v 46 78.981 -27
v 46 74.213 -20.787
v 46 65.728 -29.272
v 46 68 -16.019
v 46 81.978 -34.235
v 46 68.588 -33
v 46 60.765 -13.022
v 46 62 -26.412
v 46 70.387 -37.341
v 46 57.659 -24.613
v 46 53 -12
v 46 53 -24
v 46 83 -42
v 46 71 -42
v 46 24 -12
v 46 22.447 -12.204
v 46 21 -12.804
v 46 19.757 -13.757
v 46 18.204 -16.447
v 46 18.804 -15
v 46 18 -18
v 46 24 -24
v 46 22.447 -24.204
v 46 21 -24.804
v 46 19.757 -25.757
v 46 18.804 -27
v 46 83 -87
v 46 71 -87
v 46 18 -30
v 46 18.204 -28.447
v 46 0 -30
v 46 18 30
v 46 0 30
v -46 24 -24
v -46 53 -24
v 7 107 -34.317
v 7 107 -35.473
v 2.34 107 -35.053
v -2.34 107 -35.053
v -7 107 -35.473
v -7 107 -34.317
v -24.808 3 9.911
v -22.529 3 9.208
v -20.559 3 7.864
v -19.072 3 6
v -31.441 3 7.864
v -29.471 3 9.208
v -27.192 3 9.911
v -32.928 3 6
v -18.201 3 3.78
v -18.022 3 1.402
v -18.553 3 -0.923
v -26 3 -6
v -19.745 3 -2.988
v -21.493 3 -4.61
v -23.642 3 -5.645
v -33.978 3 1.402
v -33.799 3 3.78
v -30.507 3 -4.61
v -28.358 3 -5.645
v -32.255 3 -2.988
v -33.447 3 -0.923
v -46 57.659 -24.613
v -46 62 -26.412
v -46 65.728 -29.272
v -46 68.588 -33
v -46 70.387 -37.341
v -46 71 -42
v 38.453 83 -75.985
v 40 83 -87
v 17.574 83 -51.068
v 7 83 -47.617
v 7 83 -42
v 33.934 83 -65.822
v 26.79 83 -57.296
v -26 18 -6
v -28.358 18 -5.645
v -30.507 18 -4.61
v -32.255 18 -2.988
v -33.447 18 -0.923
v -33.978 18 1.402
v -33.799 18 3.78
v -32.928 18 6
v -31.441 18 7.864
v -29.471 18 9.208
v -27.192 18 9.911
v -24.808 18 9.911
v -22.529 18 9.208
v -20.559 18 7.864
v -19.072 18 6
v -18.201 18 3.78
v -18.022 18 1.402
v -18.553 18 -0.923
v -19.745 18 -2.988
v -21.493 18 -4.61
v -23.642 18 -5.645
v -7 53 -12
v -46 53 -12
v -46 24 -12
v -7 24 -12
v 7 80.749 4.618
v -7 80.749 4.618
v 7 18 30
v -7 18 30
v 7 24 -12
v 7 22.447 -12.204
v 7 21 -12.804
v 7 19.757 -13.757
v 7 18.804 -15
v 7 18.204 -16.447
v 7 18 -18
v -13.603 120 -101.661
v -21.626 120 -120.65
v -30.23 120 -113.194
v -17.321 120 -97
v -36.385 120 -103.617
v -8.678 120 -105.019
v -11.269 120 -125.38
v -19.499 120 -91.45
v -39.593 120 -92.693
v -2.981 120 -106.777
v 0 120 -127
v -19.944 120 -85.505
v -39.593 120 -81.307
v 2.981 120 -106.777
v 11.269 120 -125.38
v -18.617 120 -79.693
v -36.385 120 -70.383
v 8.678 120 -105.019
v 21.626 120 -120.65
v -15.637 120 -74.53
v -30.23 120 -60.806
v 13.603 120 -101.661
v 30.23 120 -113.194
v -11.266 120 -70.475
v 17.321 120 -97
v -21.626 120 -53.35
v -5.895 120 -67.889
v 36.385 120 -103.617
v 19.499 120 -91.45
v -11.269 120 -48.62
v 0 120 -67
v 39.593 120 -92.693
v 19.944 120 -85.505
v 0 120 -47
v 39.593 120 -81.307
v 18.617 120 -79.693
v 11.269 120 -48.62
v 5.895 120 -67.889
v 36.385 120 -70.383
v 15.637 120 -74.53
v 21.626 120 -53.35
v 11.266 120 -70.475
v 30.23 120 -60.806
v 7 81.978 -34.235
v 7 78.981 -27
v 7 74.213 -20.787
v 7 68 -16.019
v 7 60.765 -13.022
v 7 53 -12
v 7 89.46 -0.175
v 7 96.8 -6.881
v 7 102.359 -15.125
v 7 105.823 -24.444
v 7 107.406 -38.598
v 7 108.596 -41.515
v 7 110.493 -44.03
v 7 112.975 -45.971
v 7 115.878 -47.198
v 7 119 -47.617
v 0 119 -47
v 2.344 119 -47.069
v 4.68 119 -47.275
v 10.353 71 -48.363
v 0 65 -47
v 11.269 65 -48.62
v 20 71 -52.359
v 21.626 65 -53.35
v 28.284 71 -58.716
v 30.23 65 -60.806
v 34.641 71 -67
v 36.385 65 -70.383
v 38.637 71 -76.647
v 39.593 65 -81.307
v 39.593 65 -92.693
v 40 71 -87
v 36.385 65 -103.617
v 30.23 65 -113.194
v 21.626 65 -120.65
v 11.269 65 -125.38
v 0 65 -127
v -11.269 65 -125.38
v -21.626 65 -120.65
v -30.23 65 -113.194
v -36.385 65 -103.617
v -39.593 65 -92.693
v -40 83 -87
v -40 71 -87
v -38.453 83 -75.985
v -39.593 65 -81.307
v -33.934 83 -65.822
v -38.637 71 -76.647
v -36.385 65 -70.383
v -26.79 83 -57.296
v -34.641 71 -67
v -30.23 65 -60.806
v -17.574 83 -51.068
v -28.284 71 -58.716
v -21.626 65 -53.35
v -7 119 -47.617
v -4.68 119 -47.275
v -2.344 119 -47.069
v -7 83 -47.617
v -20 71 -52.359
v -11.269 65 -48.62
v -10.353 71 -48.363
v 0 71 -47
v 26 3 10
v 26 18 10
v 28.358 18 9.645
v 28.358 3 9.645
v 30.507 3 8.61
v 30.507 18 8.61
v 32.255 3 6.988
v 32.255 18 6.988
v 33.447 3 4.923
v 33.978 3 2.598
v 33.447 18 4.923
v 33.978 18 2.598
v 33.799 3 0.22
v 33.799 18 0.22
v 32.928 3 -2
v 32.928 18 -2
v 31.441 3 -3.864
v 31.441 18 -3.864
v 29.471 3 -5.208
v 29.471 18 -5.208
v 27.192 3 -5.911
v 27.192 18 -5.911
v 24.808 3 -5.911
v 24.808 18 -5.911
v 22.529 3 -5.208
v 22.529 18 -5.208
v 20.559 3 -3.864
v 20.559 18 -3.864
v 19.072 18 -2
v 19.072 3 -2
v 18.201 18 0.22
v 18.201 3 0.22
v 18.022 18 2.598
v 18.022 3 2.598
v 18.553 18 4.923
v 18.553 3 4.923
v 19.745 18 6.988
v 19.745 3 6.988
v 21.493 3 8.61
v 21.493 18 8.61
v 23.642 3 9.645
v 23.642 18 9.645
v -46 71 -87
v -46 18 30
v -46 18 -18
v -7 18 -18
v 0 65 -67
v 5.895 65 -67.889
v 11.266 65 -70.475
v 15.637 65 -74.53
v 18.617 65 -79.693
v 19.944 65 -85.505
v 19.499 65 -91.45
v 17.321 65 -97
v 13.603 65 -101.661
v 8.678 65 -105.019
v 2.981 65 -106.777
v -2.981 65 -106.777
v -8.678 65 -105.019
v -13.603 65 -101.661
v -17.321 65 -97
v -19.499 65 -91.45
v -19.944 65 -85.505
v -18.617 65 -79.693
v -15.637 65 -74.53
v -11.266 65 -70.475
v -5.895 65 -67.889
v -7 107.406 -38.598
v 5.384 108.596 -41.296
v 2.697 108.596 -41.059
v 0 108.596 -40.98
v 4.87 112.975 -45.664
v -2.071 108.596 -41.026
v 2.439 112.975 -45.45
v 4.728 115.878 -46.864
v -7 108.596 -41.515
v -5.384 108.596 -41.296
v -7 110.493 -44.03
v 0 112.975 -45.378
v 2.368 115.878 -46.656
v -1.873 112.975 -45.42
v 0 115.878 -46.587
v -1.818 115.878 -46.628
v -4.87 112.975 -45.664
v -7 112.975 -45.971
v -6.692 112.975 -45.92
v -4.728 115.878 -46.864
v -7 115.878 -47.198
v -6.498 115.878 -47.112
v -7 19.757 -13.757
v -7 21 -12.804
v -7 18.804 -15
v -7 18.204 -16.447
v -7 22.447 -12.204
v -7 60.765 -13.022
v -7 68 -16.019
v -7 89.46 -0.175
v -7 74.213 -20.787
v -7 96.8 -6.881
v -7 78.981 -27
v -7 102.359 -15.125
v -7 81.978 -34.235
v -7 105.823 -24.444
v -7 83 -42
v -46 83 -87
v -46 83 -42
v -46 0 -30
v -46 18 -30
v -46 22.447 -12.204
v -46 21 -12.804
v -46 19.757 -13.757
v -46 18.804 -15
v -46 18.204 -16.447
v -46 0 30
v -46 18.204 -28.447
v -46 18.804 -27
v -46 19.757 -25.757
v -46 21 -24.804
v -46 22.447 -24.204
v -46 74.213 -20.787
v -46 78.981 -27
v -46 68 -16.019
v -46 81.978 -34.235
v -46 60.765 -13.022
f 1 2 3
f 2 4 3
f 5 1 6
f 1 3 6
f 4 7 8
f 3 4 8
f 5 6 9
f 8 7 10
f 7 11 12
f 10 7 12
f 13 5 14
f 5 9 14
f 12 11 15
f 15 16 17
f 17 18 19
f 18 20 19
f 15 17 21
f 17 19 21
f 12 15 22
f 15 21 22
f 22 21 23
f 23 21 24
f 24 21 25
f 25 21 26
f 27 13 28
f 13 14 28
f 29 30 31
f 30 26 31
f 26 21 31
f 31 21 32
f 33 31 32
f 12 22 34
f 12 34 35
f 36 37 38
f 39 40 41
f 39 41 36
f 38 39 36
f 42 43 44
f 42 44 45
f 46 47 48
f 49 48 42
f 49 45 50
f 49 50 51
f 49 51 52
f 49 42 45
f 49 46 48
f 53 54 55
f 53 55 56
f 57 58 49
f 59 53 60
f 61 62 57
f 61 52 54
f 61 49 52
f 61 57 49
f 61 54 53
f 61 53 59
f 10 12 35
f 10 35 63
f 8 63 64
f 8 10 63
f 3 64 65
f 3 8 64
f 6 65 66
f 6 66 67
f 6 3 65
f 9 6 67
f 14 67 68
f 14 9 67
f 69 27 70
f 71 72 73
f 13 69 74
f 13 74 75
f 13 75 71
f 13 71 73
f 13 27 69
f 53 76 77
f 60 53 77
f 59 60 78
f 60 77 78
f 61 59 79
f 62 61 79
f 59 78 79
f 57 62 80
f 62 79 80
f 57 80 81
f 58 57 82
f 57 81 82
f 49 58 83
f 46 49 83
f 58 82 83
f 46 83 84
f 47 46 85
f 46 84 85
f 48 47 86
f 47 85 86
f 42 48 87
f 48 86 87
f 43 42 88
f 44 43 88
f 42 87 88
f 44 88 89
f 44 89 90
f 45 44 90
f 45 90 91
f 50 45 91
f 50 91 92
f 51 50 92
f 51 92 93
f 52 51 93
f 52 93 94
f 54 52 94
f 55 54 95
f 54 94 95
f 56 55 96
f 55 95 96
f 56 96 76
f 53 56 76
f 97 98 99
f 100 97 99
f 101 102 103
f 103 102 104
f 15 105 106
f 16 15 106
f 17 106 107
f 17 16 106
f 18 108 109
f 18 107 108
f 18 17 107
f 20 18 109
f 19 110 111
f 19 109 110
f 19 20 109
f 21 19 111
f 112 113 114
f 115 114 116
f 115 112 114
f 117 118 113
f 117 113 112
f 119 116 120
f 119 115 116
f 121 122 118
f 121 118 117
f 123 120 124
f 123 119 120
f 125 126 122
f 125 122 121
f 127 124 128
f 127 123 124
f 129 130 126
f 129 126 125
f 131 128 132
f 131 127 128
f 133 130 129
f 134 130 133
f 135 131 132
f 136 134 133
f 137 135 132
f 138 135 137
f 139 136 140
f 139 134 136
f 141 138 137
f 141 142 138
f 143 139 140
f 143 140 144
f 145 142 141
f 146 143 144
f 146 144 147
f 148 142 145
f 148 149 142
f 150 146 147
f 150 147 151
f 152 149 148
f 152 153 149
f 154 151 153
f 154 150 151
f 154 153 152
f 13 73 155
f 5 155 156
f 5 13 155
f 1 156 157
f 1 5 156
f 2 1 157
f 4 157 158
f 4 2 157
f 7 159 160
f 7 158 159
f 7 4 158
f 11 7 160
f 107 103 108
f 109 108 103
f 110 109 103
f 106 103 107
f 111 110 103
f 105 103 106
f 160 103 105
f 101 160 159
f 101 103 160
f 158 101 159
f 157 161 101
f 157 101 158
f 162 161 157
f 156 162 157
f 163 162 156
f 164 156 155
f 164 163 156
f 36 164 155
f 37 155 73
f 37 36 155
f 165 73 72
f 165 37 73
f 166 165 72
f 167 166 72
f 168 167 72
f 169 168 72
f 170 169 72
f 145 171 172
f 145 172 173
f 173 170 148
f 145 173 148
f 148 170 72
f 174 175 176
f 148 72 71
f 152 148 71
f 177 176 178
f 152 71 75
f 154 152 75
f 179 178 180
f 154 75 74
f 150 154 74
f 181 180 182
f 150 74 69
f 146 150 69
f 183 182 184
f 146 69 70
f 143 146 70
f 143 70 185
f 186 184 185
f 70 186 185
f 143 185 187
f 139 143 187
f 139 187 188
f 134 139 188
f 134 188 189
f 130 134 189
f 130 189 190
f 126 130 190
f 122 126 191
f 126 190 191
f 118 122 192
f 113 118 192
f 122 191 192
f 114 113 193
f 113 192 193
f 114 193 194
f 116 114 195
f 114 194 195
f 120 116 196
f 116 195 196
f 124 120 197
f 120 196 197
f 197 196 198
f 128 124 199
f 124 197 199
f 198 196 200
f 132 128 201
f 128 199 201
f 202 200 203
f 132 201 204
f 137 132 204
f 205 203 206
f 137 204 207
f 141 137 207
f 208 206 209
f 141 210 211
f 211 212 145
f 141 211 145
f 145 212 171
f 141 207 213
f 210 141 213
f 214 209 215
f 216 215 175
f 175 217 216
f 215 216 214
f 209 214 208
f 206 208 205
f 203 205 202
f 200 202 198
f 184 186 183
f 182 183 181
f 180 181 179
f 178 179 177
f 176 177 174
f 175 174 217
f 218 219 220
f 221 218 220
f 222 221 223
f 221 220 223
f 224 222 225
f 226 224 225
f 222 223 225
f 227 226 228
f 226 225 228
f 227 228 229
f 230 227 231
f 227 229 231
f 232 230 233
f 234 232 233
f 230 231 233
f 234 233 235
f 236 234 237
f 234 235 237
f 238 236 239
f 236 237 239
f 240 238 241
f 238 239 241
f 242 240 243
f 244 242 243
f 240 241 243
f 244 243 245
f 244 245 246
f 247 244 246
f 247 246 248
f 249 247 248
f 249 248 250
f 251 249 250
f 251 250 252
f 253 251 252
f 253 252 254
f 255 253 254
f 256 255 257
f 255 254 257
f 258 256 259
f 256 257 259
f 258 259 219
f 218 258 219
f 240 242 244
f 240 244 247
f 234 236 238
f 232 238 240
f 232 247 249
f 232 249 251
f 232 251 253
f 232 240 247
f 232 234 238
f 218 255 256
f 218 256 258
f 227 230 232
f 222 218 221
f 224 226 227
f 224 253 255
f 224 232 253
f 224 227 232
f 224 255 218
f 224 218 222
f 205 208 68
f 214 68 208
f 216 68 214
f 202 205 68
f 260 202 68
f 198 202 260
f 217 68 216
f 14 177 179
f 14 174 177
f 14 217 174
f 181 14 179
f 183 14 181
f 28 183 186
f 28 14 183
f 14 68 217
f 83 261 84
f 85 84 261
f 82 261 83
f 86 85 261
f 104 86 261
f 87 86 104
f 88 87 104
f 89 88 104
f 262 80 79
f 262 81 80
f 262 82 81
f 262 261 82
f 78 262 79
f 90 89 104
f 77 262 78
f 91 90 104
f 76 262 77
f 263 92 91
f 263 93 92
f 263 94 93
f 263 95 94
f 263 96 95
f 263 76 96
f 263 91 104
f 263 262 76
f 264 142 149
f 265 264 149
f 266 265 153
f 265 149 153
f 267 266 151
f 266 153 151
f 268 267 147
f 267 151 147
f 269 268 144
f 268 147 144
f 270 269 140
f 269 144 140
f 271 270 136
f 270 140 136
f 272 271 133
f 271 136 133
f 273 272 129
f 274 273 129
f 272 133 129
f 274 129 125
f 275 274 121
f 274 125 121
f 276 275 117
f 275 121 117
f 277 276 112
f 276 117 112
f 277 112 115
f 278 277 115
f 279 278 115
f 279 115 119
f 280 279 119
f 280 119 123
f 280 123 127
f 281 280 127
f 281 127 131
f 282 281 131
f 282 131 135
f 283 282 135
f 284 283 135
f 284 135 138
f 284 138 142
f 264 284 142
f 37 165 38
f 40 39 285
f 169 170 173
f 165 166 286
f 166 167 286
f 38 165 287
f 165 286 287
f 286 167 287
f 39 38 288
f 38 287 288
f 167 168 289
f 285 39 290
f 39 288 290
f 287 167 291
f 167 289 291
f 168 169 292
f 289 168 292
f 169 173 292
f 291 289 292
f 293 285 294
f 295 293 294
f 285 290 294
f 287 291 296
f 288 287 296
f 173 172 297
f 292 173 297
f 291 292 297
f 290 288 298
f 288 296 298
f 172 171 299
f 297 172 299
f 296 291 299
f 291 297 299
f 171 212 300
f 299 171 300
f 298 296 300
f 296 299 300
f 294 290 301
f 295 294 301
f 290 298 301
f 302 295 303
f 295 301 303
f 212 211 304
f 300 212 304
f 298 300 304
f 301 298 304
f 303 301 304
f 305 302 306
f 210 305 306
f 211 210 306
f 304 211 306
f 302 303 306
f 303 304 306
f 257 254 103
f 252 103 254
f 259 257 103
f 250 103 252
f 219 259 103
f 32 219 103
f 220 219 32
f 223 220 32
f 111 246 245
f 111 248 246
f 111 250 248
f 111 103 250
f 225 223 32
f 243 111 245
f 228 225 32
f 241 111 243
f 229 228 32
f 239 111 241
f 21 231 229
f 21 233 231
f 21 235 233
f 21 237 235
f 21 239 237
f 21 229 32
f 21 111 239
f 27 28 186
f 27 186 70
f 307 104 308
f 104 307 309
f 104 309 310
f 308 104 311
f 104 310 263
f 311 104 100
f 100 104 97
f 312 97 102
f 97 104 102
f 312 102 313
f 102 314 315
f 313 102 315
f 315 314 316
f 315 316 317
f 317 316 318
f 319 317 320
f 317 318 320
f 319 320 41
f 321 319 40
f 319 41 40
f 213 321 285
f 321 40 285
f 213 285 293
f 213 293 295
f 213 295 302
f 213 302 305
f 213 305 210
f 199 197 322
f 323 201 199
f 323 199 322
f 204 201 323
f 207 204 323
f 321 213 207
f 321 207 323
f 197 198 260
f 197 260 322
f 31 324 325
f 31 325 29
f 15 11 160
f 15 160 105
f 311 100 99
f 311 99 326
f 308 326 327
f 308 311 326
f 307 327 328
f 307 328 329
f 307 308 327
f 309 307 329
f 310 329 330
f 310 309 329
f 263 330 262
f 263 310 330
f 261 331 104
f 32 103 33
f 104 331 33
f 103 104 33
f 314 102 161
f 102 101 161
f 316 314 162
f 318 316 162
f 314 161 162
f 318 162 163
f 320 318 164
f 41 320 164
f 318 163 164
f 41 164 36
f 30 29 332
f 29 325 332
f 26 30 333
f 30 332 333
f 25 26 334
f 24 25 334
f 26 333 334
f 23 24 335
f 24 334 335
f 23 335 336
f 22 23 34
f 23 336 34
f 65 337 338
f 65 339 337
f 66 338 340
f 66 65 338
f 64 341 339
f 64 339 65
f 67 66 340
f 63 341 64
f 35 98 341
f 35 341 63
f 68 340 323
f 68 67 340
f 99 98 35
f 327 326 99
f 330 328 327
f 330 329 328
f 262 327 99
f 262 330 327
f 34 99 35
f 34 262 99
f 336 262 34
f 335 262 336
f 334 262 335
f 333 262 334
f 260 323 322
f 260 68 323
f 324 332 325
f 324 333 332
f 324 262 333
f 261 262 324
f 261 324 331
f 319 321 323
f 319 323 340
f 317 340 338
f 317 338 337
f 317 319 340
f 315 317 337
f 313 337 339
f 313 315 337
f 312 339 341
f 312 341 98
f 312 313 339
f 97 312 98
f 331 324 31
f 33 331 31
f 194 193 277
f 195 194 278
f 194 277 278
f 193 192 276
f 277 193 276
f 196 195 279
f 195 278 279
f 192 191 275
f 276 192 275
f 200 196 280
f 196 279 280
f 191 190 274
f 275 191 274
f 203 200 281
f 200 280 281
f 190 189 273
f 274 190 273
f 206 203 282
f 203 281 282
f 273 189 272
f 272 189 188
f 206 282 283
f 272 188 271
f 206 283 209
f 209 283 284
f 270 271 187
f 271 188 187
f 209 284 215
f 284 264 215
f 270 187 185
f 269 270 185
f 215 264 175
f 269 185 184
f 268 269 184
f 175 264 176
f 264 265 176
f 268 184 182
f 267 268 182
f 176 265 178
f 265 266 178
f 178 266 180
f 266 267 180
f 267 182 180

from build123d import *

# Parameters (mm, degrees)
CROQUIS1_W                   = 92
CROQUIS1_H                   = 60
SALIENTE_EXTRUIR1_DEPTH      = 18
CROQUIS2_R                   = 8
CORTAR_EXTRUIR1_DEPTH        = 15
SALIENTE_EXTRUIR2_DEPTH      = 92
REDONDEO1_R                  = 6
SALIENTE_EXTRUIR4_DEPTH      = 37
SALIENTE_EXTRUIR4_DEPTH_BACK = 18
CROQUIS4_R                   = 40
CROQUIS5_R                   = 20
CORTAR_EXTRUIR2_DEPTH        = 181.679273853
NERVIO1_START                = -7
NERVIO1_DEPTH                = 14
REDONDEO2_R                  = 42
REDONDEO3_R                  = 12


# Read off the part's stored shape, not the designer's step: Nervio1
with BuildPart() as part:
    # Croquis1 → Saliente-Extruir1 (new body)
    with BuildSketch(Plane(origin=(0, 0, 0), x_dir=(1, 0, 0), z_dir=(0, 1, 0))):
        Rectangle(CROQUIS1_W, CROQUIS1_H)
    extrude(amount=SALIENTE_EXTRUIR1_DEPTH)

    # Croquis2 → Cortar-Extruir1 (cut)
    with BuildSketch(Plane(origin=(0, 18, 0), x_dir=(1, 0, 0), z_dir=(0, 1, 0))):
        with Locations(Location((26, -2, 0), (0, 0, 270))):
            Circle(CROQUIS2_R)
        with Locations(Location((-26, -2, 0), (0, 0, 90))):
            Circle(CROQUIS2_R)
    extrude(amount=-CORTAR_EXTRUIR1_DEPTH, mode=Mode.SUBTRACT)

    # Croquis3 → Saliente-Extruir2 (add, through all)
    with BuildSketch(Plane(origin=(46, 0, 0), x_dir=(0, 0, -1), z_dir=(1, 0, 0))):
        with BuildLine():
            Line((18, 18), (24, 18))
            Line((24, 18), (24, 53))
            ThreePointArc((24, 53), (29.272077939, 65.727922061), (42, 71))
            Line((42, 71), (87, 71))
            Line((87, 71), (87, 83))
            Line((87, 83), (42, 83))
            ThreePointArc((42, 83), (20.786796564, 74.213203436), (12, 53))
            Line((12, 53), (12, 24))
            ThreePointArc((12, 24), (13.757359313, 19.757359313), (18, 18))
        make_face()
    extrude(amount=-SALIENTE_EXTRUIR2_DEPTH)

    # Redondeo1
    redondeo1_edges = [part.edges().sort_by_distance(p)[0] for p in [
        (0, 18, -24),
    ]]
    fillet(redondeo1_edges, radius=REDONDEO1_R - 0.0001)  # a hair under: the kernel refuses the full size

    # Croquis4 → Saliente-Extruir4 (add, two sides: drawn at the far end of the back side and taken through both)
    with BuildSketch(Plane(origin=(0, 83, 0), x_dir=(1, 0, 0), z_dir=(0, 1, 0)).offset(-SALIENTE_EXTRUIR4_DEPTH_BACK)):
        with Locations(Location((0, 87, 0), (0, 0, 270))):
            Circle(CROQUIS4_R)
    extrude(amount=SALIENTE_EXTRUIR4_DEPTH + SALIENTE_EXTRUIR4_DEPTH_BACK)

    # Croquis5 → Cortar-Extruir2 (cut, through all)
    with BuildSketch(Plane(origin=(0, 120, 0), x_dir=(1, 0, 0), z_dir=(0, 1, 0))):
        with Locations(Location((0, 87, 0), (0, 0, 270))):
            Circle(CROQUIS5_R)
    extrude(amount=-CORTAR_EXTRUIR2_DEPTH, mode=Mode.SUBTRACT)

    # Nervio1 outline → Nervio1 (add)
    with BuildSketch(Plane(origin=(0, 0, 0), x_dir=(0, 0, -1), z_dir=(1, 0, 0)).offset(NERVIO1_START)):
        with BuildLine():
            Line((42, 83), (48, 83))
            Line((48, 83), (48, 107))
            Line((48, 107), (6, 107))
            Line((6, 107), (-30, 18))
            Line((-30, 18), (18, 18))
            ThreePointArc((18, 18), (13.757359313, 19.757359313), (12, 24))
            Line((12, 24), (12, 53))
            ThreePointArc((12, 53), (20.786796564, 74.213203436), (42, 83))
        make_face()
    extrude(amount=NERVIO1_DEPTH)

    # Redondeo2
    redondeo2_edges = [part.edges().sort_by_distance(p)[0] for p in [
        (0, 107, -6),
    ]]
    fillet(redondeo2_edges, radius=REDONDEO2_R)

    # Redondeo3
    redondeo3_edges = [part.edges().sort_by_distance(p)[0] for p in [
        (-3.513581264, 107, -47.154614487),
    ]]
    fillet(redondeo3_edges, radius=REDONDEO3_R)


solid = part.part
